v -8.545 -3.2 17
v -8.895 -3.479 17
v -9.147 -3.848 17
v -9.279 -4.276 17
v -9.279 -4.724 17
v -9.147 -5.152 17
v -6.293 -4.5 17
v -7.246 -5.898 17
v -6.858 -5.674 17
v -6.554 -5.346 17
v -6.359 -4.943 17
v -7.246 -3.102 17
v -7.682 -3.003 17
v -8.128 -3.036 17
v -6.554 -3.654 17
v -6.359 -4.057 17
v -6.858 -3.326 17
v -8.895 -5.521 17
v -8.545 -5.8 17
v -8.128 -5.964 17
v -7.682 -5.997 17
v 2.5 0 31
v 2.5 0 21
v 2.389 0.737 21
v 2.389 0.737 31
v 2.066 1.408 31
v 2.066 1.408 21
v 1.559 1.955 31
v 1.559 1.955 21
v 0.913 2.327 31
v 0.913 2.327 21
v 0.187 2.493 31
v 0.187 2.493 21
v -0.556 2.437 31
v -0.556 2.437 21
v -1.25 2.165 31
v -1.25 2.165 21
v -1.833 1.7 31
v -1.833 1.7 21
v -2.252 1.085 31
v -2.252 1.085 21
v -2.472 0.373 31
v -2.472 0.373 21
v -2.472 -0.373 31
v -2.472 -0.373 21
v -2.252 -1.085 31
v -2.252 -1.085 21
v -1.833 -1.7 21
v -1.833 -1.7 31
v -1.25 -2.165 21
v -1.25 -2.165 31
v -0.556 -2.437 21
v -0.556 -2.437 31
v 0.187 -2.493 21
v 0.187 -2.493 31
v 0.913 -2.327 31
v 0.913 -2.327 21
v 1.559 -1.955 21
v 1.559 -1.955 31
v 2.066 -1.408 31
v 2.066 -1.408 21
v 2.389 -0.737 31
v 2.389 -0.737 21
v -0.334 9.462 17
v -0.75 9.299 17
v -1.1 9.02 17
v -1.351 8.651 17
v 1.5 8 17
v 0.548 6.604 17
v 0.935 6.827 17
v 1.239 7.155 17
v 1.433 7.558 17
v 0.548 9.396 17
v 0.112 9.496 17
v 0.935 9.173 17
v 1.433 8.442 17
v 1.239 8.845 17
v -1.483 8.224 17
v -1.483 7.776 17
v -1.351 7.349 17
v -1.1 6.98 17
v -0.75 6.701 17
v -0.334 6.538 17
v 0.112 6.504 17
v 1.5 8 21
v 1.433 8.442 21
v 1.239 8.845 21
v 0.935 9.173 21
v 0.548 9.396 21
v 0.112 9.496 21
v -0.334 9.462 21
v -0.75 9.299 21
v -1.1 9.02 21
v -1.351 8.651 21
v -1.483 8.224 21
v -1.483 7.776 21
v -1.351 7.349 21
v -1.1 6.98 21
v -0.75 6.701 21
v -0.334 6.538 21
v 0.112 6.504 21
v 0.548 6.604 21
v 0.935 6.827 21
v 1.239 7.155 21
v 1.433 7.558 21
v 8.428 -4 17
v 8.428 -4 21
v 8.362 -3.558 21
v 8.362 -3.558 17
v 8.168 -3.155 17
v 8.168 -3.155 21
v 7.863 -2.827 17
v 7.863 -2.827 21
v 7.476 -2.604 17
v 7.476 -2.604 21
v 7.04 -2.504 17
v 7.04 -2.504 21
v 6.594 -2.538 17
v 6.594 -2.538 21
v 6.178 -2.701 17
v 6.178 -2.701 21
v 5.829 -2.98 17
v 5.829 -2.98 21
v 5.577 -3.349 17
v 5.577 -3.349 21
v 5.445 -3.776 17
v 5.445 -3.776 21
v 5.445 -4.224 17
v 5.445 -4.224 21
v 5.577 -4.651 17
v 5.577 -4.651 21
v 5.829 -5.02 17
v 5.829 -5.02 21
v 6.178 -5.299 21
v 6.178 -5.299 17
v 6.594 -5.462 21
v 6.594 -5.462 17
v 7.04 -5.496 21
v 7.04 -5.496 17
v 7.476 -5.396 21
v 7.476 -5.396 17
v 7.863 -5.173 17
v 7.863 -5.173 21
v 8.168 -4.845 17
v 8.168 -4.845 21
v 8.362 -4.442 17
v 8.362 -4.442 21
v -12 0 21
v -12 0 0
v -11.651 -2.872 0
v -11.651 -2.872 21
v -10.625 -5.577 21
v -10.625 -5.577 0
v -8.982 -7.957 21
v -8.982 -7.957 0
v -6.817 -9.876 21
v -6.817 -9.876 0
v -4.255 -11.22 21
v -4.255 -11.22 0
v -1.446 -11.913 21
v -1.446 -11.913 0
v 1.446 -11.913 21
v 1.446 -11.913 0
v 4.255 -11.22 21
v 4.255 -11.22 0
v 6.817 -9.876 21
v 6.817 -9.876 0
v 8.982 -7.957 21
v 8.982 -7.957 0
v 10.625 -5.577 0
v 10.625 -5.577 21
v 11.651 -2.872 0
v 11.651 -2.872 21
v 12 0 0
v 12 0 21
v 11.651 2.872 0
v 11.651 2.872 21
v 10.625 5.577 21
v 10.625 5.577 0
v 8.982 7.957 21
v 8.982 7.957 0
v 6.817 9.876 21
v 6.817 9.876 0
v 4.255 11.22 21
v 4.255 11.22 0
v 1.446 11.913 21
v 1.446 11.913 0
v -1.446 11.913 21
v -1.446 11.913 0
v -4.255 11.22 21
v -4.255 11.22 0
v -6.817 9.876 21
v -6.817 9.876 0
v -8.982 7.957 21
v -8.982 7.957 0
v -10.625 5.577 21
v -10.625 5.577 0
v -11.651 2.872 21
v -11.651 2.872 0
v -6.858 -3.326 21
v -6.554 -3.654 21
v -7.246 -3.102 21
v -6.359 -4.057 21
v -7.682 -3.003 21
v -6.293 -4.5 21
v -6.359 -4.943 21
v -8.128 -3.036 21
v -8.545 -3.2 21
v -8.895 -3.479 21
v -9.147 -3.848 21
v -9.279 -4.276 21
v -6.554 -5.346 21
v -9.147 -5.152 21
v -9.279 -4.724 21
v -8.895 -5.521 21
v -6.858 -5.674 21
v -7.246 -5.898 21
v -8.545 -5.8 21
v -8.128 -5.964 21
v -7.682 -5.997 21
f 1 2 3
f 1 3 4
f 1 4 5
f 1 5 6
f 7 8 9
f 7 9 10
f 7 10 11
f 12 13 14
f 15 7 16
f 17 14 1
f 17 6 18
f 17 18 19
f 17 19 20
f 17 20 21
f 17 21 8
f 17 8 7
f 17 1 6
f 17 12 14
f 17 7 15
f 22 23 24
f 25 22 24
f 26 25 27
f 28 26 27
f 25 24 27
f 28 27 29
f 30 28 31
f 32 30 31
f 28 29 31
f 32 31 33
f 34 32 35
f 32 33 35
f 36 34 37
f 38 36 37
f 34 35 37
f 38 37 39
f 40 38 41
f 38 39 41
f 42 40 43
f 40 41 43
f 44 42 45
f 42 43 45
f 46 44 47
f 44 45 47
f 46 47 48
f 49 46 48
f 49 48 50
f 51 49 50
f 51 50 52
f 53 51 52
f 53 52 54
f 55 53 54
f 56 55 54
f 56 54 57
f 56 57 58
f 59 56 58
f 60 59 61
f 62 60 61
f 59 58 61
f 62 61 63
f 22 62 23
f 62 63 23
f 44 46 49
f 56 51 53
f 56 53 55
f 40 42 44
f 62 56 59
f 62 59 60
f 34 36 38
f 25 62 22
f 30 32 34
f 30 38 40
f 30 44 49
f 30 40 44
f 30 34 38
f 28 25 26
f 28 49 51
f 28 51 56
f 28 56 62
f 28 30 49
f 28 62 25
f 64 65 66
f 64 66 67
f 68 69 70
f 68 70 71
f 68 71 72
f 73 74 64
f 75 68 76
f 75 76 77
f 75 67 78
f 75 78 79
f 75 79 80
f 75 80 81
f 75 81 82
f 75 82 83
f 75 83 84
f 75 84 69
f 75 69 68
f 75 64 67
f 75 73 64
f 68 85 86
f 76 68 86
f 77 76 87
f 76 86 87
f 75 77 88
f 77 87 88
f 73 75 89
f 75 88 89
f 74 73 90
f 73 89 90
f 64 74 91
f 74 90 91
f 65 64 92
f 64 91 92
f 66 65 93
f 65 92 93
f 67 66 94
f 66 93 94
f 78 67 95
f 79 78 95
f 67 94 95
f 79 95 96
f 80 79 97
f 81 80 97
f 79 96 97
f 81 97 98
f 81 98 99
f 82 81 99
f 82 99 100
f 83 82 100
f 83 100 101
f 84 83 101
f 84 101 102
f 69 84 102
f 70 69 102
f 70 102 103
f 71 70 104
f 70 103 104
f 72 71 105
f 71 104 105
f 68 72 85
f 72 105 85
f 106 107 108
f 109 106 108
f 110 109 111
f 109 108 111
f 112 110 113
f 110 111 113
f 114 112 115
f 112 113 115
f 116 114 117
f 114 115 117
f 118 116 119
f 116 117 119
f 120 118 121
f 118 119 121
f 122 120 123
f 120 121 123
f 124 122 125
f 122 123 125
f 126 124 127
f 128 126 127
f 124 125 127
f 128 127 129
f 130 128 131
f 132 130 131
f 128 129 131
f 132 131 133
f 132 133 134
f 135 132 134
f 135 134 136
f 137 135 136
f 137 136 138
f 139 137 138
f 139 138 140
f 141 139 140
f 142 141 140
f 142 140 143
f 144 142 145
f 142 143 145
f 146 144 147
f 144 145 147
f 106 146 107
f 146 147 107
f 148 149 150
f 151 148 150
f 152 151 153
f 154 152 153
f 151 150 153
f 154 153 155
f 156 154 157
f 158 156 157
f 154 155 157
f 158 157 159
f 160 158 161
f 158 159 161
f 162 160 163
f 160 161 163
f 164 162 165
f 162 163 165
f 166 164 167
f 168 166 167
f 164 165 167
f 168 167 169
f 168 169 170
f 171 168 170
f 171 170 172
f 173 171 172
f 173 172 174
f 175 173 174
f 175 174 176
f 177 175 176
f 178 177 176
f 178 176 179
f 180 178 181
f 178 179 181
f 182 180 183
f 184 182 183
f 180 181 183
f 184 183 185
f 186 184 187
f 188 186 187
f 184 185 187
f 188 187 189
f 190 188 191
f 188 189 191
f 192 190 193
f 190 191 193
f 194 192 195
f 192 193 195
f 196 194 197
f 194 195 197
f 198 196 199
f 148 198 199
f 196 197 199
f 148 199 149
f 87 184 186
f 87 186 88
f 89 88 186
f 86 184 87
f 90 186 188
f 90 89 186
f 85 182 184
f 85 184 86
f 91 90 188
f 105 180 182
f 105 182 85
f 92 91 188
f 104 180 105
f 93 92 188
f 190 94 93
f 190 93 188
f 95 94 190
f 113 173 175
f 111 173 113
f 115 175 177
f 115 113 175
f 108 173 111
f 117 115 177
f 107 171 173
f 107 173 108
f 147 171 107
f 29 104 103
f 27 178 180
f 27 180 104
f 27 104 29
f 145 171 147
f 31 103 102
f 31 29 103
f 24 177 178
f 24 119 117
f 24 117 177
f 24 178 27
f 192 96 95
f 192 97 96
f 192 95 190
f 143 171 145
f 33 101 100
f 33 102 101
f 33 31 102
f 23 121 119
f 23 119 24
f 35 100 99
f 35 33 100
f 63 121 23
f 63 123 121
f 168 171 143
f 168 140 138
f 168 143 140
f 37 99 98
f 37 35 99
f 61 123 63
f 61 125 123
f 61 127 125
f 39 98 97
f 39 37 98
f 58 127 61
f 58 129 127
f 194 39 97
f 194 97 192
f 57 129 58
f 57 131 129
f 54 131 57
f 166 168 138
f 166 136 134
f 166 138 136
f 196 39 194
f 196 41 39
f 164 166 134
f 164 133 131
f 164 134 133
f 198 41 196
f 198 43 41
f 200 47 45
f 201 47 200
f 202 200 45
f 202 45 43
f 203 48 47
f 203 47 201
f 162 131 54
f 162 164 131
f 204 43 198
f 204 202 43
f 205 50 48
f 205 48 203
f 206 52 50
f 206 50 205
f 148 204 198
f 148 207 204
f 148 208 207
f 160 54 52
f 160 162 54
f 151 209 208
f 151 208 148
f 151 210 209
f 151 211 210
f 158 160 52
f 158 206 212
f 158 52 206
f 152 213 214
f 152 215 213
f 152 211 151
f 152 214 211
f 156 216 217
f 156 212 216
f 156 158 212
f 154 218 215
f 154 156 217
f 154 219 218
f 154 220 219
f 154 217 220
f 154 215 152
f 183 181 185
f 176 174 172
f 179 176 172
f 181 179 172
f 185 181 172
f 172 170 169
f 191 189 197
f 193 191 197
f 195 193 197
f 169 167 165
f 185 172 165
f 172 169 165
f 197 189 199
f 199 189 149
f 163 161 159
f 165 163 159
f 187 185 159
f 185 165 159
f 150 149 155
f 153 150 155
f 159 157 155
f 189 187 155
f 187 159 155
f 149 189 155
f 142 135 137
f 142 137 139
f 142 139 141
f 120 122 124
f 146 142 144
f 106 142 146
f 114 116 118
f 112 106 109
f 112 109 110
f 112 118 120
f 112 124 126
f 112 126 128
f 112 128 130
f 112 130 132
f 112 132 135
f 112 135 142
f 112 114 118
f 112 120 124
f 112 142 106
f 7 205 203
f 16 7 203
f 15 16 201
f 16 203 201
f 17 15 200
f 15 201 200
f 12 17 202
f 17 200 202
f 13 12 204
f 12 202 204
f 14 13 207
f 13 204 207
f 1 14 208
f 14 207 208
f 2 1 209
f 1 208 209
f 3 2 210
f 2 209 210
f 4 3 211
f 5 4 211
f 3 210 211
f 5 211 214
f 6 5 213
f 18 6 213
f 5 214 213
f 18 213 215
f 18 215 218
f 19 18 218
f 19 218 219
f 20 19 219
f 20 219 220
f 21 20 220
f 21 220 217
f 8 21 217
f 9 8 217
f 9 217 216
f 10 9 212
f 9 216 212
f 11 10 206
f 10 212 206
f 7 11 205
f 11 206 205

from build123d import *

# Parameters (mm, degrees)
ESQUISSE1_R             = 12
BOSS_EXTRU_1_DEPTH      = 21
ESQUISSE2_R             = 2.5
BOSS_EXTRU_2_DEPTH      = 10
ESQUISSE3_R             = 1.5
ESQUISSE3_R_2           = 1.501649619
ENL_V_MAT_EXTRU_1_DEPTH = 4


with BuildPart() as part:
    # Esquisse1 → Boss.-Extru.1 (new body)
    with BuildSketch(Plane.XY):
        with Locations(Location((0, 0, 0), (0, 0, 180))):
            Circle(ESQUISSE1_R)
    extrude(amount=BOSS_EXTRU_1_DEPTH)

    # Esquisse2 → Boss.-Extru.2 (add)
    with BuildSketch(Plane.XY.offset(21)):
        Circle(ESQUISSE2_R)
    extrude(amount=BOSS_EXTRU_2_DEPTH)

    # Esquisse3 → Enlèv. mat.-Extru.1 (cut)
    with BuildSketch(Plane.XY.offset(21)):
        with Locations((0, 8)):
            Circle(ESQUISSE3_R)
        with Locations((-7.794228634, -4.5)):
            Circle(ESQUISSE3_R_2)
        with Locations((6.92820323, -4)):
            Circle(ESQUISSE3_R)
    extrude(amount=-ENL_V_MAT_EXTRU_1_DEPTH, mode=Mode.SUBTRACT)


solid = part.part
